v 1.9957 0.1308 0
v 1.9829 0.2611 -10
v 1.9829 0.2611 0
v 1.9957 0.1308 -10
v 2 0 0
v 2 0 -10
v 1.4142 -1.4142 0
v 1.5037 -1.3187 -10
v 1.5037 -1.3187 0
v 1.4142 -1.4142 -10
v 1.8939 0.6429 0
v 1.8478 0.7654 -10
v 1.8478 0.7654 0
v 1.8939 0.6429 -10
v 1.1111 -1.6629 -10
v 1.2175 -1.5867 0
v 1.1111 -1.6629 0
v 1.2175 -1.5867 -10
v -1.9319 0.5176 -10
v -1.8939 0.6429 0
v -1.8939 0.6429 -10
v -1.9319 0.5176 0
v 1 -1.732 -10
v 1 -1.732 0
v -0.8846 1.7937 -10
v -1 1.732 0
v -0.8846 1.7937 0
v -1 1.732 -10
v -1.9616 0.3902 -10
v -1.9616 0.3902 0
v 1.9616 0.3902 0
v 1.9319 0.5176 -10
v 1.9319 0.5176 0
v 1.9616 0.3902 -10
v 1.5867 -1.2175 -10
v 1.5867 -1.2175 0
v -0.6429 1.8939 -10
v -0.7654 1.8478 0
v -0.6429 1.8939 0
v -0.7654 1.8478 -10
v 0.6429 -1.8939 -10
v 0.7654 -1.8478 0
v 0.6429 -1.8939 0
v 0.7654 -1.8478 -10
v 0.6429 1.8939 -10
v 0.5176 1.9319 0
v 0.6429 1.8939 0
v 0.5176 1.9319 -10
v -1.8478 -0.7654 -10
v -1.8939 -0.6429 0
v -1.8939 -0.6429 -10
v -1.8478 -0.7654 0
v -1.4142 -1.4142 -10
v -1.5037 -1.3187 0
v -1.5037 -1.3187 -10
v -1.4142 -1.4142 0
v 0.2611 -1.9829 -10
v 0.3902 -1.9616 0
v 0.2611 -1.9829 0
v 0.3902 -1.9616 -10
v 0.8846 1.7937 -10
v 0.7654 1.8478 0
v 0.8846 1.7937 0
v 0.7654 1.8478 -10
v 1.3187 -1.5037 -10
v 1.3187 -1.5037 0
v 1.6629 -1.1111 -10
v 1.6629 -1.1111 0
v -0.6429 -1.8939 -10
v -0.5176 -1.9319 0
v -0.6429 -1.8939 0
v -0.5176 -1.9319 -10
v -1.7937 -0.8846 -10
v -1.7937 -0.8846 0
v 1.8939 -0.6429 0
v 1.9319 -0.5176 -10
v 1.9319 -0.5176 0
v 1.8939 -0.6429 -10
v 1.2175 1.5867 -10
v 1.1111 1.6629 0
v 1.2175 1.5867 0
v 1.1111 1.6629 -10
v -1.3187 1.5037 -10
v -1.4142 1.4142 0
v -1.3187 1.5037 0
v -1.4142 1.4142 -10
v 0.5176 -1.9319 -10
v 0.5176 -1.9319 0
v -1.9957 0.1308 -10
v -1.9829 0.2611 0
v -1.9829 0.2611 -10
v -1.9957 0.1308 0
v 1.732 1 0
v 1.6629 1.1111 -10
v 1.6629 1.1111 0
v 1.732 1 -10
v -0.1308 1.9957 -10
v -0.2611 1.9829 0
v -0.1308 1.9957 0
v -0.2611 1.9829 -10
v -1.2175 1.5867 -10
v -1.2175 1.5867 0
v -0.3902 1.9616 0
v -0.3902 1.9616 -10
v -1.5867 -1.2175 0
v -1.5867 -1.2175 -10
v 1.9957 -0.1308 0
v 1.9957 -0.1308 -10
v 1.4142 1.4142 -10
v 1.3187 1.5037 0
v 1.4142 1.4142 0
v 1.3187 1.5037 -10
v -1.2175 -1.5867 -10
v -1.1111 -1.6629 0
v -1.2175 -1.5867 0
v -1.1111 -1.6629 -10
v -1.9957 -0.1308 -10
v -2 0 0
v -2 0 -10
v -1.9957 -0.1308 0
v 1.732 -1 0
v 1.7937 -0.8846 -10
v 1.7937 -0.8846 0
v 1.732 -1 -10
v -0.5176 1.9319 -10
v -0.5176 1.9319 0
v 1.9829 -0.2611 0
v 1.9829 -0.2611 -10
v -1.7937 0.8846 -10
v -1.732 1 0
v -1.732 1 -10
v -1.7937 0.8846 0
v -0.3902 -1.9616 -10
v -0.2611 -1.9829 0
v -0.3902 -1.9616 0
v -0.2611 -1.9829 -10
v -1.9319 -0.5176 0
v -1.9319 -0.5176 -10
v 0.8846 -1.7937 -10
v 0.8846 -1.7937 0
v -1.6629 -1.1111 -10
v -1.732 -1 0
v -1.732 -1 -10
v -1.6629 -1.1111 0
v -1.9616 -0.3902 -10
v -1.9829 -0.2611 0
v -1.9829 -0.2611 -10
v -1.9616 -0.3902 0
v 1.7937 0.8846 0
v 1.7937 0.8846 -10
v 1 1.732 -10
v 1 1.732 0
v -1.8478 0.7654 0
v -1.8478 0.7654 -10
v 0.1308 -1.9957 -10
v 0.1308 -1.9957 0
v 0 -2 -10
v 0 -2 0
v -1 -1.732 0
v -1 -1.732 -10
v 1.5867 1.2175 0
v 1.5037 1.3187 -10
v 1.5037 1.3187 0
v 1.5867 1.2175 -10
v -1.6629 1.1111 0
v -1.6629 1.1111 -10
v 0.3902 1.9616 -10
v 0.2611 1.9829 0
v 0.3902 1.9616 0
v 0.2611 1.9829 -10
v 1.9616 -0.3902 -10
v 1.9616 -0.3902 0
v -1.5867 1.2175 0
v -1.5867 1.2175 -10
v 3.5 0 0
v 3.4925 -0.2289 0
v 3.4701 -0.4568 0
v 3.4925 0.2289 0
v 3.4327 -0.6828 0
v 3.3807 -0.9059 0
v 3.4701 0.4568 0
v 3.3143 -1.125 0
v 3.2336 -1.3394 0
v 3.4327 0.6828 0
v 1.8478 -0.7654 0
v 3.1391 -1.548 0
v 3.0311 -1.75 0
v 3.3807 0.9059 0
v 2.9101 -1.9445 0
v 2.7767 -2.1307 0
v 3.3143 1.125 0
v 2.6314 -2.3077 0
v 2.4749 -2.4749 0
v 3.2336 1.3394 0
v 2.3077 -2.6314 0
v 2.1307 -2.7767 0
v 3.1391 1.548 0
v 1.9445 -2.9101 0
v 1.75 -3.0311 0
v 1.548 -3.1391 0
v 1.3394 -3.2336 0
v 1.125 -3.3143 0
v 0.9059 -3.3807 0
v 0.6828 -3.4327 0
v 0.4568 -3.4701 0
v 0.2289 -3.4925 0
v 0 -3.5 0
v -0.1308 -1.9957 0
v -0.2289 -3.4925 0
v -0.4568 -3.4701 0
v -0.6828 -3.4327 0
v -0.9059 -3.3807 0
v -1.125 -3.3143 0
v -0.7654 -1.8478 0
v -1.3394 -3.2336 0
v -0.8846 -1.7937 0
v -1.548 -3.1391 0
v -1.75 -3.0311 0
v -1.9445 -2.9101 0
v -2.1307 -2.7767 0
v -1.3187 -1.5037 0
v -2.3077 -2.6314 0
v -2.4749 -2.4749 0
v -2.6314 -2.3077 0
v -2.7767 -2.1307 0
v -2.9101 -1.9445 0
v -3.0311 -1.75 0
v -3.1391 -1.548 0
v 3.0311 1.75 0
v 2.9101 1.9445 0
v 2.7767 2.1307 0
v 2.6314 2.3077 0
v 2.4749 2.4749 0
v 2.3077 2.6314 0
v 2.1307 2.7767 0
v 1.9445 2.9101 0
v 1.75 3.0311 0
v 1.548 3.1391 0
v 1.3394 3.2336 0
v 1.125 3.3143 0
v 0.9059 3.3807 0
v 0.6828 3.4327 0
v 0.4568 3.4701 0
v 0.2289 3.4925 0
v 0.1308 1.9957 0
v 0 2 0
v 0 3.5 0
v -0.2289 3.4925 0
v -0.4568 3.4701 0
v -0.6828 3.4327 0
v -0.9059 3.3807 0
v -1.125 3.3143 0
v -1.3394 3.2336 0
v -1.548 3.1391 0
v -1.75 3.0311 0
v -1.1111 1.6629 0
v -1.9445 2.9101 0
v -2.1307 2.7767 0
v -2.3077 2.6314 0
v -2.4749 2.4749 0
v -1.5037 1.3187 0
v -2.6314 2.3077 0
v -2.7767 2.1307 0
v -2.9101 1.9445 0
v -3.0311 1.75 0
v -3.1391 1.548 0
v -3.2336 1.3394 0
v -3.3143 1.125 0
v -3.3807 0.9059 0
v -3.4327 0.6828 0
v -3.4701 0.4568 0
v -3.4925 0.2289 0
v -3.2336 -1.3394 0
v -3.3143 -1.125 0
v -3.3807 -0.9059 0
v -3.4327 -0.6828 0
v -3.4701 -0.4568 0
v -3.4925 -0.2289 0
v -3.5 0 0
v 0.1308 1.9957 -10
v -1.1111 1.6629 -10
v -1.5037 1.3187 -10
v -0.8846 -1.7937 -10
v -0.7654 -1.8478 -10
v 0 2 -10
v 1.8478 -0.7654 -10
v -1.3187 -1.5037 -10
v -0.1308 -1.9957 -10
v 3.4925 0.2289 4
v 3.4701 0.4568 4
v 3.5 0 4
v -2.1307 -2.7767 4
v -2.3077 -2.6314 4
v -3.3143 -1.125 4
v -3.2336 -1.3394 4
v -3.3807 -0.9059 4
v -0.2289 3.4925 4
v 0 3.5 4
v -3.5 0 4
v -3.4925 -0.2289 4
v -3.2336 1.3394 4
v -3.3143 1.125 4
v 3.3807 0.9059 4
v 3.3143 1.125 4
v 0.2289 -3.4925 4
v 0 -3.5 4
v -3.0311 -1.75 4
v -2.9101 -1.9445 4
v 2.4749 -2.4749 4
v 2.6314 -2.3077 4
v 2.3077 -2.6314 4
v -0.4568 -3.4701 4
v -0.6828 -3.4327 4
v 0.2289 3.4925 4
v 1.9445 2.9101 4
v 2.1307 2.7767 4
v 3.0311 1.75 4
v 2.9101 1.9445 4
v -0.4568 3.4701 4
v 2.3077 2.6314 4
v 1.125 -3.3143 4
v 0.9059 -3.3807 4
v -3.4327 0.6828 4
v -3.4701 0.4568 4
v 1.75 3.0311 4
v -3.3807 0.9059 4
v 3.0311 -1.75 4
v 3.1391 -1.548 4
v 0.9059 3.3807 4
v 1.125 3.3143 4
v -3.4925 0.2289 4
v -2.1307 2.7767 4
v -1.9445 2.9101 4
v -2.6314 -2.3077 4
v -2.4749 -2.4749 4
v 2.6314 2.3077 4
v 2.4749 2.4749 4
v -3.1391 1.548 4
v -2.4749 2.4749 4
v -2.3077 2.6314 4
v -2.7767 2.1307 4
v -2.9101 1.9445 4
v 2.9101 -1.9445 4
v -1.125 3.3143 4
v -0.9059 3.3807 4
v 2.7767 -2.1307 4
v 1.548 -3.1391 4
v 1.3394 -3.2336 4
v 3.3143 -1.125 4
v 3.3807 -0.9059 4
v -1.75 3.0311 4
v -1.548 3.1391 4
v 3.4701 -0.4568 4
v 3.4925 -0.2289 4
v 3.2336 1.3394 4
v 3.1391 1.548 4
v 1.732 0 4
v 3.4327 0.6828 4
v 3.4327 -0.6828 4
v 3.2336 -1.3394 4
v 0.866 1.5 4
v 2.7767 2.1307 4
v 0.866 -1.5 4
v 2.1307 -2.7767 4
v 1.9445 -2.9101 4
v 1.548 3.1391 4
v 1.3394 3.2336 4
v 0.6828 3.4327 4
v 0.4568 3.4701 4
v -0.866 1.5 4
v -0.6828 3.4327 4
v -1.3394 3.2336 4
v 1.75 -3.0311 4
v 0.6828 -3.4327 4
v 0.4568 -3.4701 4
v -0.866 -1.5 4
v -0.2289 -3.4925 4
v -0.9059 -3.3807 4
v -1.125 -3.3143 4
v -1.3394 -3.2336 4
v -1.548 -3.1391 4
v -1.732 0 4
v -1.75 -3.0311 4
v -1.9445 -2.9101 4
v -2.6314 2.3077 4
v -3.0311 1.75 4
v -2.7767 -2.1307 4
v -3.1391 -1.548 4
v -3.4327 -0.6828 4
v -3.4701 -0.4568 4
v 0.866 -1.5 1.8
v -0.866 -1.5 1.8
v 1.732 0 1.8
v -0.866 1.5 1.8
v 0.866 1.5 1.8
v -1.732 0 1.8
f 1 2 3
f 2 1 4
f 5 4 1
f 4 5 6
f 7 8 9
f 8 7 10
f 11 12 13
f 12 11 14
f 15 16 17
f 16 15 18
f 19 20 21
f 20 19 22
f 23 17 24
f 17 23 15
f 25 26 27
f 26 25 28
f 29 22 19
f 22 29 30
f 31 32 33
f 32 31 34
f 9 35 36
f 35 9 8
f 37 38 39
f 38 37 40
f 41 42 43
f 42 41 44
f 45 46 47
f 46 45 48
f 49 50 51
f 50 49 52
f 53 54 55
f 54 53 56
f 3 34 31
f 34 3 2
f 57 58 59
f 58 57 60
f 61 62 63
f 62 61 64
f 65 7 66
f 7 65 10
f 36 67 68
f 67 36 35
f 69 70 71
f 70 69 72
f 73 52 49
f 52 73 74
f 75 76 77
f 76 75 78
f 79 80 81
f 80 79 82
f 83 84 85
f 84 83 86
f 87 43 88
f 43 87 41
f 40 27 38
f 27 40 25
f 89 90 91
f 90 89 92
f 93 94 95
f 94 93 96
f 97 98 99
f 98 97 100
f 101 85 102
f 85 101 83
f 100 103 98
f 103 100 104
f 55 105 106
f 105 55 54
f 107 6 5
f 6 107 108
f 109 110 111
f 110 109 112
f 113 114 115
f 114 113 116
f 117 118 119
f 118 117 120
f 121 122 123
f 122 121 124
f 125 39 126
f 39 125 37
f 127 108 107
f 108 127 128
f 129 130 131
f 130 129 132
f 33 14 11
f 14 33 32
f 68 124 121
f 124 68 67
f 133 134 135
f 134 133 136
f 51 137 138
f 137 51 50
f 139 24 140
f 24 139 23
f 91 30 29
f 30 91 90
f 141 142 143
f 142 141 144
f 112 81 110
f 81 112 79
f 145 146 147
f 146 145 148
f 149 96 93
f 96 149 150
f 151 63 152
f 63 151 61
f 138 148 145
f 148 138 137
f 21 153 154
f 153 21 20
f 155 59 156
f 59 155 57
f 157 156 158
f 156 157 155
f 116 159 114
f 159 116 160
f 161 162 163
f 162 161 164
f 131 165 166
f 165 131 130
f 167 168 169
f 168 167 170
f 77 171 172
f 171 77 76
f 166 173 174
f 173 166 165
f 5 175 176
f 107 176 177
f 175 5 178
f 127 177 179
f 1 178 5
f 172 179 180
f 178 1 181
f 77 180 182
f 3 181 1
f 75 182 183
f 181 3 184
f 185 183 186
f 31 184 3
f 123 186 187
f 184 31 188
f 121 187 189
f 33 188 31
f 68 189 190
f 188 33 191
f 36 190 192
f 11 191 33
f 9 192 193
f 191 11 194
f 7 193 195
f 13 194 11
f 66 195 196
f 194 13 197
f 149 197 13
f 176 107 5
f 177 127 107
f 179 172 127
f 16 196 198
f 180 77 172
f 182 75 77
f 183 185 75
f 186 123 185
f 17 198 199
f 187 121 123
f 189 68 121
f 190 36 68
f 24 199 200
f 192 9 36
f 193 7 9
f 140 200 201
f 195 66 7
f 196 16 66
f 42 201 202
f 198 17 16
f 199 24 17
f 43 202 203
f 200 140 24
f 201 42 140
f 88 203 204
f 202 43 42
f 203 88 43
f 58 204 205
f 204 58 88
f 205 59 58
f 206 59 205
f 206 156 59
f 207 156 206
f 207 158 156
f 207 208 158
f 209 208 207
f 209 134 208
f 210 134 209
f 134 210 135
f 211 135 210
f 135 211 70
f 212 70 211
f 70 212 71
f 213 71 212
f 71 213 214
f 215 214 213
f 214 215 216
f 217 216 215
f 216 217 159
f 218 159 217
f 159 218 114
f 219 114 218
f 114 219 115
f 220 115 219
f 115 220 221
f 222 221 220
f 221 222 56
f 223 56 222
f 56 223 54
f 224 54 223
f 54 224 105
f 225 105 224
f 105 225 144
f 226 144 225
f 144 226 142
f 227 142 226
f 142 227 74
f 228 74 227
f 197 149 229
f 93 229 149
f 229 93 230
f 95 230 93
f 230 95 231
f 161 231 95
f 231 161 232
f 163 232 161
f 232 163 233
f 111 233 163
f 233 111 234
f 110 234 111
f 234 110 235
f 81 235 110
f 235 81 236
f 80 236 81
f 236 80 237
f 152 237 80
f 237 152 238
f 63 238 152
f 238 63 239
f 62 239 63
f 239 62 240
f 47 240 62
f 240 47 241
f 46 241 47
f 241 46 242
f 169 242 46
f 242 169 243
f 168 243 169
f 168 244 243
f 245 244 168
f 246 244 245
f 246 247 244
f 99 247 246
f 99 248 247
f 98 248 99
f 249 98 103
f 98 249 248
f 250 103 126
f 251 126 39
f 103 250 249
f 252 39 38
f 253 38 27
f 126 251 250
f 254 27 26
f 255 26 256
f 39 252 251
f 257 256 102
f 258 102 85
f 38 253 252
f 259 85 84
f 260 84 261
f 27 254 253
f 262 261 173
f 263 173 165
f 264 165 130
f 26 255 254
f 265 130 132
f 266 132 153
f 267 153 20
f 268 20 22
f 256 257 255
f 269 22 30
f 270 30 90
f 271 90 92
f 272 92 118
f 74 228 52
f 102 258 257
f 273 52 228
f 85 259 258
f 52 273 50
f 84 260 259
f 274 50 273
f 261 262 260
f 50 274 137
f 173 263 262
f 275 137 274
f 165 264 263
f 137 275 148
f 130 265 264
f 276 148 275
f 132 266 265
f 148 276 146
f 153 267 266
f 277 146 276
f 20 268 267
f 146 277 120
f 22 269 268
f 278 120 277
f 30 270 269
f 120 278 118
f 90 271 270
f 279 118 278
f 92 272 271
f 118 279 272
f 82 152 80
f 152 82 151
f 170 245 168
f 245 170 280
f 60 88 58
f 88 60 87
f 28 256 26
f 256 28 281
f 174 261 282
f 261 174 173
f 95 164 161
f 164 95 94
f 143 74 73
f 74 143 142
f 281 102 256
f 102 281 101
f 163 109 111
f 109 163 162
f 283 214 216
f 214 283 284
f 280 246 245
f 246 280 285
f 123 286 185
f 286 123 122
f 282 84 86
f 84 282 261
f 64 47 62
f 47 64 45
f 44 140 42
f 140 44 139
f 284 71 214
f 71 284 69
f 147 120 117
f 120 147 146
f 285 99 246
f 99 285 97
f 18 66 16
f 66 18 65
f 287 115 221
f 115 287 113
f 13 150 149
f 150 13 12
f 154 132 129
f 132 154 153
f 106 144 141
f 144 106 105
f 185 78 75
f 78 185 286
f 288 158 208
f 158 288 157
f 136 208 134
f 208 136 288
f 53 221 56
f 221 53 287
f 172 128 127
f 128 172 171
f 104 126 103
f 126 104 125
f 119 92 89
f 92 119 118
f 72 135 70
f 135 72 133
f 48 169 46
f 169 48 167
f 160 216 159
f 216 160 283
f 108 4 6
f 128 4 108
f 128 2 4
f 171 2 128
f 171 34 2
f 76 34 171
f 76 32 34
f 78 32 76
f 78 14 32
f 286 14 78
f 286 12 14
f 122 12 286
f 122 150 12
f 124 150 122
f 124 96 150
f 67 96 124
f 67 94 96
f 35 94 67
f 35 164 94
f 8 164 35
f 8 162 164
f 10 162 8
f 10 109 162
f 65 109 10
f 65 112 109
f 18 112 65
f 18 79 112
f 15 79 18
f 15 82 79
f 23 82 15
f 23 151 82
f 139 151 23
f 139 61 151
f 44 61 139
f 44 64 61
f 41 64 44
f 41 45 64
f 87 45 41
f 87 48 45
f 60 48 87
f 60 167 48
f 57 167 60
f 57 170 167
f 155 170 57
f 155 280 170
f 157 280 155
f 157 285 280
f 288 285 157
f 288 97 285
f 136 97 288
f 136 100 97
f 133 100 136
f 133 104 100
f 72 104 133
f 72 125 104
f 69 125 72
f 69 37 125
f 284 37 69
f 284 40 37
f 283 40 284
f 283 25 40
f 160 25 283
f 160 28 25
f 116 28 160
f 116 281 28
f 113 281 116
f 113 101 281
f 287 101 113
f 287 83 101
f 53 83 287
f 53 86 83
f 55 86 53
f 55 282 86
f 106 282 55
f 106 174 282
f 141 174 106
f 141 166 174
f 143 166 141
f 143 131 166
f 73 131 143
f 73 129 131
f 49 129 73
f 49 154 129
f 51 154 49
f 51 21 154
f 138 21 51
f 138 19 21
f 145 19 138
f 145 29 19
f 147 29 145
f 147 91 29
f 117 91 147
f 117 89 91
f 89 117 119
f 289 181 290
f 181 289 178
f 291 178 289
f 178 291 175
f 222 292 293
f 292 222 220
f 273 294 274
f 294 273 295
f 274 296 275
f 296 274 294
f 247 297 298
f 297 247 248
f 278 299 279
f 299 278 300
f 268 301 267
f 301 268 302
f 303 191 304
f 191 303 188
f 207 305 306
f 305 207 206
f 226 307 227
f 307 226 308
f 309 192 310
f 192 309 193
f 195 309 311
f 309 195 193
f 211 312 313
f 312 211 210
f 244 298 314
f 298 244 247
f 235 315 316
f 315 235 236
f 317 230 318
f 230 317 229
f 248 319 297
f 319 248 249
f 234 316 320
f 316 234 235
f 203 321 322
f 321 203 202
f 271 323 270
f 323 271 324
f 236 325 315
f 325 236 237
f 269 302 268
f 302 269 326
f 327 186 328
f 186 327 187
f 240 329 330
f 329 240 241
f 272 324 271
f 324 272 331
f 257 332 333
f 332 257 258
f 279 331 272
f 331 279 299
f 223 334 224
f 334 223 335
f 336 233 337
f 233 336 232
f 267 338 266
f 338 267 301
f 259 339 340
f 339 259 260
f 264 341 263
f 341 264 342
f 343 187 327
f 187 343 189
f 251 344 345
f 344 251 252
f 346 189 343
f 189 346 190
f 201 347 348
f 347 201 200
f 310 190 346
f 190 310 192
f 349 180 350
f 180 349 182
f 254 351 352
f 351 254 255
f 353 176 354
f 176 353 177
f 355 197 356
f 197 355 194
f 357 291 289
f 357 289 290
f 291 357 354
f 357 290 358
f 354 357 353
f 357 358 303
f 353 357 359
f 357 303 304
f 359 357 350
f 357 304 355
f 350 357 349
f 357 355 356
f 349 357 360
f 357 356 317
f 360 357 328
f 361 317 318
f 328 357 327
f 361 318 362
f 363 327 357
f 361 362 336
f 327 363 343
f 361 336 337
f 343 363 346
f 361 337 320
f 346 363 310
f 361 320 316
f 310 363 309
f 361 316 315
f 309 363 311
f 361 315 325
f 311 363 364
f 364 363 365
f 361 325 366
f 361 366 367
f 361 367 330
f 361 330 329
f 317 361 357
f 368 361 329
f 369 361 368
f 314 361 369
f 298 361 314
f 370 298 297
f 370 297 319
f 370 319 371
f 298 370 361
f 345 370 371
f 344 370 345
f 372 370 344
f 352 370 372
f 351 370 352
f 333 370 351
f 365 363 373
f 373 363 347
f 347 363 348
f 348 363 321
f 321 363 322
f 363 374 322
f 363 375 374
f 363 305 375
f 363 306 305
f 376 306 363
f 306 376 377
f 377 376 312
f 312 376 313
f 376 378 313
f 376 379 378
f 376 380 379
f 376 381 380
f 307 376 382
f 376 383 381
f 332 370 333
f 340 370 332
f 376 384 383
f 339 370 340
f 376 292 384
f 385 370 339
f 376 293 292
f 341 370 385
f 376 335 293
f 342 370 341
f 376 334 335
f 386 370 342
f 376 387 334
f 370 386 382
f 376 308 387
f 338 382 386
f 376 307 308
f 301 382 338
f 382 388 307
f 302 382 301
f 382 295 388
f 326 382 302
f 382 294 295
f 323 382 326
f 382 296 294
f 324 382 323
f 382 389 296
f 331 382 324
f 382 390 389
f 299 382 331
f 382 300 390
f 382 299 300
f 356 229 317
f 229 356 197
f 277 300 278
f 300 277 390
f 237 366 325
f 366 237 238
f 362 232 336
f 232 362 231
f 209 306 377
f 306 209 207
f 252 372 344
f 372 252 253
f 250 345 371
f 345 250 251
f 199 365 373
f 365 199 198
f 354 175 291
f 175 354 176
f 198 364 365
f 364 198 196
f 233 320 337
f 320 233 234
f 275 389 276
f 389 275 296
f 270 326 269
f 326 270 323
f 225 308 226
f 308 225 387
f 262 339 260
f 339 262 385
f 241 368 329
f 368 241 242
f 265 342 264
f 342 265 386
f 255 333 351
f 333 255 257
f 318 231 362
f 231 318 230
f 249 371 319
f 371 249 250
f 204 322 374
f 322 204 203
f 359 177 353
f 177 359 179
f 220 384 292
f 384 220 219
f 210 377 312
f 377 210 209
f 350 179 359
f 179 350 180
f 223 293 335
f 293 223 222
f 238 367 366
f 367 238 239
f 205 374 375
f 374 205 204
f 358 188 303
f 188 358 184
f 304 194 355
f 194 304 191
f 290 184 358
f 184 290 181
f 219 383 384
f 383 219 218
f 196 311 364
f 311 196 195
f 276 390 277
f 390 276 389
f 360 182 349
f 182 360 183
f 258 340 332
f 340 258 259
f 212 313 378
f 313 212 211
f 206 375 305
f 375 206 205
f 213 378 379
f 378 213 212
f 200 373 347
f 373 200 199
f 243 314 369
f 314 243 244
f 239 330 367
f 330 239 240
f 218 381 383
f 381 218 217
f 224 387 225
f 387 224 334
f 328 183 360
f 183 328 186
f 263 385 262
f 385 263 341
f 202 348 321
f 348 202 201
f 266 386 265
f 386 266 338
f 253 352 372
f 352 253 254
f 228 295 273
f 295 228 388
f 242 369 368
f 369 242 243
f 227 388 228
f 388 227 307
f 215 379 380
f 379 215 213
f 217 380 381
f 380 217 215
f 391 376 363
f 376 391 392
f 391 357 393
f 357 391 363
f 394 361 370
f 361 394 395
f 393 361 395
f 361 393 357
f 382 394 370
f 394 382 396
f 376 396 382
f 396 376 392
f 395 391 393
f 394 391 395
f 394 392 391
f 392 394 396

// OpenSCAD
$fn = 96;

d_shaft = 4.0;
L = 10.0;

d_head = 7.0;
h_head = 4.0;

// Typical ISO 4762 M4 socket dimensions (approx)
hex_af = 3.0;          // across flats
hex_depth = 2.2;       // socket depth
hex_corner_d = hex_af / cos(30); // across corners for a hex prism

module socket_head_cap_screw() {
    difference() {
        union() {
            // Shaft (under-head length)
            translate([0,0,-L])
                cylinder(h=L, d=d_shaft);

            // Head
            cylinder(h=h_head, d=d_head);
        }

        // Hex socket cut
        translate([0,0,h_head - hex_depth])
            cylinder(h=hex_depth + 0.2, d=hex_corner_d, $fn=6);
    }
}

socket_head_cap_screw();
